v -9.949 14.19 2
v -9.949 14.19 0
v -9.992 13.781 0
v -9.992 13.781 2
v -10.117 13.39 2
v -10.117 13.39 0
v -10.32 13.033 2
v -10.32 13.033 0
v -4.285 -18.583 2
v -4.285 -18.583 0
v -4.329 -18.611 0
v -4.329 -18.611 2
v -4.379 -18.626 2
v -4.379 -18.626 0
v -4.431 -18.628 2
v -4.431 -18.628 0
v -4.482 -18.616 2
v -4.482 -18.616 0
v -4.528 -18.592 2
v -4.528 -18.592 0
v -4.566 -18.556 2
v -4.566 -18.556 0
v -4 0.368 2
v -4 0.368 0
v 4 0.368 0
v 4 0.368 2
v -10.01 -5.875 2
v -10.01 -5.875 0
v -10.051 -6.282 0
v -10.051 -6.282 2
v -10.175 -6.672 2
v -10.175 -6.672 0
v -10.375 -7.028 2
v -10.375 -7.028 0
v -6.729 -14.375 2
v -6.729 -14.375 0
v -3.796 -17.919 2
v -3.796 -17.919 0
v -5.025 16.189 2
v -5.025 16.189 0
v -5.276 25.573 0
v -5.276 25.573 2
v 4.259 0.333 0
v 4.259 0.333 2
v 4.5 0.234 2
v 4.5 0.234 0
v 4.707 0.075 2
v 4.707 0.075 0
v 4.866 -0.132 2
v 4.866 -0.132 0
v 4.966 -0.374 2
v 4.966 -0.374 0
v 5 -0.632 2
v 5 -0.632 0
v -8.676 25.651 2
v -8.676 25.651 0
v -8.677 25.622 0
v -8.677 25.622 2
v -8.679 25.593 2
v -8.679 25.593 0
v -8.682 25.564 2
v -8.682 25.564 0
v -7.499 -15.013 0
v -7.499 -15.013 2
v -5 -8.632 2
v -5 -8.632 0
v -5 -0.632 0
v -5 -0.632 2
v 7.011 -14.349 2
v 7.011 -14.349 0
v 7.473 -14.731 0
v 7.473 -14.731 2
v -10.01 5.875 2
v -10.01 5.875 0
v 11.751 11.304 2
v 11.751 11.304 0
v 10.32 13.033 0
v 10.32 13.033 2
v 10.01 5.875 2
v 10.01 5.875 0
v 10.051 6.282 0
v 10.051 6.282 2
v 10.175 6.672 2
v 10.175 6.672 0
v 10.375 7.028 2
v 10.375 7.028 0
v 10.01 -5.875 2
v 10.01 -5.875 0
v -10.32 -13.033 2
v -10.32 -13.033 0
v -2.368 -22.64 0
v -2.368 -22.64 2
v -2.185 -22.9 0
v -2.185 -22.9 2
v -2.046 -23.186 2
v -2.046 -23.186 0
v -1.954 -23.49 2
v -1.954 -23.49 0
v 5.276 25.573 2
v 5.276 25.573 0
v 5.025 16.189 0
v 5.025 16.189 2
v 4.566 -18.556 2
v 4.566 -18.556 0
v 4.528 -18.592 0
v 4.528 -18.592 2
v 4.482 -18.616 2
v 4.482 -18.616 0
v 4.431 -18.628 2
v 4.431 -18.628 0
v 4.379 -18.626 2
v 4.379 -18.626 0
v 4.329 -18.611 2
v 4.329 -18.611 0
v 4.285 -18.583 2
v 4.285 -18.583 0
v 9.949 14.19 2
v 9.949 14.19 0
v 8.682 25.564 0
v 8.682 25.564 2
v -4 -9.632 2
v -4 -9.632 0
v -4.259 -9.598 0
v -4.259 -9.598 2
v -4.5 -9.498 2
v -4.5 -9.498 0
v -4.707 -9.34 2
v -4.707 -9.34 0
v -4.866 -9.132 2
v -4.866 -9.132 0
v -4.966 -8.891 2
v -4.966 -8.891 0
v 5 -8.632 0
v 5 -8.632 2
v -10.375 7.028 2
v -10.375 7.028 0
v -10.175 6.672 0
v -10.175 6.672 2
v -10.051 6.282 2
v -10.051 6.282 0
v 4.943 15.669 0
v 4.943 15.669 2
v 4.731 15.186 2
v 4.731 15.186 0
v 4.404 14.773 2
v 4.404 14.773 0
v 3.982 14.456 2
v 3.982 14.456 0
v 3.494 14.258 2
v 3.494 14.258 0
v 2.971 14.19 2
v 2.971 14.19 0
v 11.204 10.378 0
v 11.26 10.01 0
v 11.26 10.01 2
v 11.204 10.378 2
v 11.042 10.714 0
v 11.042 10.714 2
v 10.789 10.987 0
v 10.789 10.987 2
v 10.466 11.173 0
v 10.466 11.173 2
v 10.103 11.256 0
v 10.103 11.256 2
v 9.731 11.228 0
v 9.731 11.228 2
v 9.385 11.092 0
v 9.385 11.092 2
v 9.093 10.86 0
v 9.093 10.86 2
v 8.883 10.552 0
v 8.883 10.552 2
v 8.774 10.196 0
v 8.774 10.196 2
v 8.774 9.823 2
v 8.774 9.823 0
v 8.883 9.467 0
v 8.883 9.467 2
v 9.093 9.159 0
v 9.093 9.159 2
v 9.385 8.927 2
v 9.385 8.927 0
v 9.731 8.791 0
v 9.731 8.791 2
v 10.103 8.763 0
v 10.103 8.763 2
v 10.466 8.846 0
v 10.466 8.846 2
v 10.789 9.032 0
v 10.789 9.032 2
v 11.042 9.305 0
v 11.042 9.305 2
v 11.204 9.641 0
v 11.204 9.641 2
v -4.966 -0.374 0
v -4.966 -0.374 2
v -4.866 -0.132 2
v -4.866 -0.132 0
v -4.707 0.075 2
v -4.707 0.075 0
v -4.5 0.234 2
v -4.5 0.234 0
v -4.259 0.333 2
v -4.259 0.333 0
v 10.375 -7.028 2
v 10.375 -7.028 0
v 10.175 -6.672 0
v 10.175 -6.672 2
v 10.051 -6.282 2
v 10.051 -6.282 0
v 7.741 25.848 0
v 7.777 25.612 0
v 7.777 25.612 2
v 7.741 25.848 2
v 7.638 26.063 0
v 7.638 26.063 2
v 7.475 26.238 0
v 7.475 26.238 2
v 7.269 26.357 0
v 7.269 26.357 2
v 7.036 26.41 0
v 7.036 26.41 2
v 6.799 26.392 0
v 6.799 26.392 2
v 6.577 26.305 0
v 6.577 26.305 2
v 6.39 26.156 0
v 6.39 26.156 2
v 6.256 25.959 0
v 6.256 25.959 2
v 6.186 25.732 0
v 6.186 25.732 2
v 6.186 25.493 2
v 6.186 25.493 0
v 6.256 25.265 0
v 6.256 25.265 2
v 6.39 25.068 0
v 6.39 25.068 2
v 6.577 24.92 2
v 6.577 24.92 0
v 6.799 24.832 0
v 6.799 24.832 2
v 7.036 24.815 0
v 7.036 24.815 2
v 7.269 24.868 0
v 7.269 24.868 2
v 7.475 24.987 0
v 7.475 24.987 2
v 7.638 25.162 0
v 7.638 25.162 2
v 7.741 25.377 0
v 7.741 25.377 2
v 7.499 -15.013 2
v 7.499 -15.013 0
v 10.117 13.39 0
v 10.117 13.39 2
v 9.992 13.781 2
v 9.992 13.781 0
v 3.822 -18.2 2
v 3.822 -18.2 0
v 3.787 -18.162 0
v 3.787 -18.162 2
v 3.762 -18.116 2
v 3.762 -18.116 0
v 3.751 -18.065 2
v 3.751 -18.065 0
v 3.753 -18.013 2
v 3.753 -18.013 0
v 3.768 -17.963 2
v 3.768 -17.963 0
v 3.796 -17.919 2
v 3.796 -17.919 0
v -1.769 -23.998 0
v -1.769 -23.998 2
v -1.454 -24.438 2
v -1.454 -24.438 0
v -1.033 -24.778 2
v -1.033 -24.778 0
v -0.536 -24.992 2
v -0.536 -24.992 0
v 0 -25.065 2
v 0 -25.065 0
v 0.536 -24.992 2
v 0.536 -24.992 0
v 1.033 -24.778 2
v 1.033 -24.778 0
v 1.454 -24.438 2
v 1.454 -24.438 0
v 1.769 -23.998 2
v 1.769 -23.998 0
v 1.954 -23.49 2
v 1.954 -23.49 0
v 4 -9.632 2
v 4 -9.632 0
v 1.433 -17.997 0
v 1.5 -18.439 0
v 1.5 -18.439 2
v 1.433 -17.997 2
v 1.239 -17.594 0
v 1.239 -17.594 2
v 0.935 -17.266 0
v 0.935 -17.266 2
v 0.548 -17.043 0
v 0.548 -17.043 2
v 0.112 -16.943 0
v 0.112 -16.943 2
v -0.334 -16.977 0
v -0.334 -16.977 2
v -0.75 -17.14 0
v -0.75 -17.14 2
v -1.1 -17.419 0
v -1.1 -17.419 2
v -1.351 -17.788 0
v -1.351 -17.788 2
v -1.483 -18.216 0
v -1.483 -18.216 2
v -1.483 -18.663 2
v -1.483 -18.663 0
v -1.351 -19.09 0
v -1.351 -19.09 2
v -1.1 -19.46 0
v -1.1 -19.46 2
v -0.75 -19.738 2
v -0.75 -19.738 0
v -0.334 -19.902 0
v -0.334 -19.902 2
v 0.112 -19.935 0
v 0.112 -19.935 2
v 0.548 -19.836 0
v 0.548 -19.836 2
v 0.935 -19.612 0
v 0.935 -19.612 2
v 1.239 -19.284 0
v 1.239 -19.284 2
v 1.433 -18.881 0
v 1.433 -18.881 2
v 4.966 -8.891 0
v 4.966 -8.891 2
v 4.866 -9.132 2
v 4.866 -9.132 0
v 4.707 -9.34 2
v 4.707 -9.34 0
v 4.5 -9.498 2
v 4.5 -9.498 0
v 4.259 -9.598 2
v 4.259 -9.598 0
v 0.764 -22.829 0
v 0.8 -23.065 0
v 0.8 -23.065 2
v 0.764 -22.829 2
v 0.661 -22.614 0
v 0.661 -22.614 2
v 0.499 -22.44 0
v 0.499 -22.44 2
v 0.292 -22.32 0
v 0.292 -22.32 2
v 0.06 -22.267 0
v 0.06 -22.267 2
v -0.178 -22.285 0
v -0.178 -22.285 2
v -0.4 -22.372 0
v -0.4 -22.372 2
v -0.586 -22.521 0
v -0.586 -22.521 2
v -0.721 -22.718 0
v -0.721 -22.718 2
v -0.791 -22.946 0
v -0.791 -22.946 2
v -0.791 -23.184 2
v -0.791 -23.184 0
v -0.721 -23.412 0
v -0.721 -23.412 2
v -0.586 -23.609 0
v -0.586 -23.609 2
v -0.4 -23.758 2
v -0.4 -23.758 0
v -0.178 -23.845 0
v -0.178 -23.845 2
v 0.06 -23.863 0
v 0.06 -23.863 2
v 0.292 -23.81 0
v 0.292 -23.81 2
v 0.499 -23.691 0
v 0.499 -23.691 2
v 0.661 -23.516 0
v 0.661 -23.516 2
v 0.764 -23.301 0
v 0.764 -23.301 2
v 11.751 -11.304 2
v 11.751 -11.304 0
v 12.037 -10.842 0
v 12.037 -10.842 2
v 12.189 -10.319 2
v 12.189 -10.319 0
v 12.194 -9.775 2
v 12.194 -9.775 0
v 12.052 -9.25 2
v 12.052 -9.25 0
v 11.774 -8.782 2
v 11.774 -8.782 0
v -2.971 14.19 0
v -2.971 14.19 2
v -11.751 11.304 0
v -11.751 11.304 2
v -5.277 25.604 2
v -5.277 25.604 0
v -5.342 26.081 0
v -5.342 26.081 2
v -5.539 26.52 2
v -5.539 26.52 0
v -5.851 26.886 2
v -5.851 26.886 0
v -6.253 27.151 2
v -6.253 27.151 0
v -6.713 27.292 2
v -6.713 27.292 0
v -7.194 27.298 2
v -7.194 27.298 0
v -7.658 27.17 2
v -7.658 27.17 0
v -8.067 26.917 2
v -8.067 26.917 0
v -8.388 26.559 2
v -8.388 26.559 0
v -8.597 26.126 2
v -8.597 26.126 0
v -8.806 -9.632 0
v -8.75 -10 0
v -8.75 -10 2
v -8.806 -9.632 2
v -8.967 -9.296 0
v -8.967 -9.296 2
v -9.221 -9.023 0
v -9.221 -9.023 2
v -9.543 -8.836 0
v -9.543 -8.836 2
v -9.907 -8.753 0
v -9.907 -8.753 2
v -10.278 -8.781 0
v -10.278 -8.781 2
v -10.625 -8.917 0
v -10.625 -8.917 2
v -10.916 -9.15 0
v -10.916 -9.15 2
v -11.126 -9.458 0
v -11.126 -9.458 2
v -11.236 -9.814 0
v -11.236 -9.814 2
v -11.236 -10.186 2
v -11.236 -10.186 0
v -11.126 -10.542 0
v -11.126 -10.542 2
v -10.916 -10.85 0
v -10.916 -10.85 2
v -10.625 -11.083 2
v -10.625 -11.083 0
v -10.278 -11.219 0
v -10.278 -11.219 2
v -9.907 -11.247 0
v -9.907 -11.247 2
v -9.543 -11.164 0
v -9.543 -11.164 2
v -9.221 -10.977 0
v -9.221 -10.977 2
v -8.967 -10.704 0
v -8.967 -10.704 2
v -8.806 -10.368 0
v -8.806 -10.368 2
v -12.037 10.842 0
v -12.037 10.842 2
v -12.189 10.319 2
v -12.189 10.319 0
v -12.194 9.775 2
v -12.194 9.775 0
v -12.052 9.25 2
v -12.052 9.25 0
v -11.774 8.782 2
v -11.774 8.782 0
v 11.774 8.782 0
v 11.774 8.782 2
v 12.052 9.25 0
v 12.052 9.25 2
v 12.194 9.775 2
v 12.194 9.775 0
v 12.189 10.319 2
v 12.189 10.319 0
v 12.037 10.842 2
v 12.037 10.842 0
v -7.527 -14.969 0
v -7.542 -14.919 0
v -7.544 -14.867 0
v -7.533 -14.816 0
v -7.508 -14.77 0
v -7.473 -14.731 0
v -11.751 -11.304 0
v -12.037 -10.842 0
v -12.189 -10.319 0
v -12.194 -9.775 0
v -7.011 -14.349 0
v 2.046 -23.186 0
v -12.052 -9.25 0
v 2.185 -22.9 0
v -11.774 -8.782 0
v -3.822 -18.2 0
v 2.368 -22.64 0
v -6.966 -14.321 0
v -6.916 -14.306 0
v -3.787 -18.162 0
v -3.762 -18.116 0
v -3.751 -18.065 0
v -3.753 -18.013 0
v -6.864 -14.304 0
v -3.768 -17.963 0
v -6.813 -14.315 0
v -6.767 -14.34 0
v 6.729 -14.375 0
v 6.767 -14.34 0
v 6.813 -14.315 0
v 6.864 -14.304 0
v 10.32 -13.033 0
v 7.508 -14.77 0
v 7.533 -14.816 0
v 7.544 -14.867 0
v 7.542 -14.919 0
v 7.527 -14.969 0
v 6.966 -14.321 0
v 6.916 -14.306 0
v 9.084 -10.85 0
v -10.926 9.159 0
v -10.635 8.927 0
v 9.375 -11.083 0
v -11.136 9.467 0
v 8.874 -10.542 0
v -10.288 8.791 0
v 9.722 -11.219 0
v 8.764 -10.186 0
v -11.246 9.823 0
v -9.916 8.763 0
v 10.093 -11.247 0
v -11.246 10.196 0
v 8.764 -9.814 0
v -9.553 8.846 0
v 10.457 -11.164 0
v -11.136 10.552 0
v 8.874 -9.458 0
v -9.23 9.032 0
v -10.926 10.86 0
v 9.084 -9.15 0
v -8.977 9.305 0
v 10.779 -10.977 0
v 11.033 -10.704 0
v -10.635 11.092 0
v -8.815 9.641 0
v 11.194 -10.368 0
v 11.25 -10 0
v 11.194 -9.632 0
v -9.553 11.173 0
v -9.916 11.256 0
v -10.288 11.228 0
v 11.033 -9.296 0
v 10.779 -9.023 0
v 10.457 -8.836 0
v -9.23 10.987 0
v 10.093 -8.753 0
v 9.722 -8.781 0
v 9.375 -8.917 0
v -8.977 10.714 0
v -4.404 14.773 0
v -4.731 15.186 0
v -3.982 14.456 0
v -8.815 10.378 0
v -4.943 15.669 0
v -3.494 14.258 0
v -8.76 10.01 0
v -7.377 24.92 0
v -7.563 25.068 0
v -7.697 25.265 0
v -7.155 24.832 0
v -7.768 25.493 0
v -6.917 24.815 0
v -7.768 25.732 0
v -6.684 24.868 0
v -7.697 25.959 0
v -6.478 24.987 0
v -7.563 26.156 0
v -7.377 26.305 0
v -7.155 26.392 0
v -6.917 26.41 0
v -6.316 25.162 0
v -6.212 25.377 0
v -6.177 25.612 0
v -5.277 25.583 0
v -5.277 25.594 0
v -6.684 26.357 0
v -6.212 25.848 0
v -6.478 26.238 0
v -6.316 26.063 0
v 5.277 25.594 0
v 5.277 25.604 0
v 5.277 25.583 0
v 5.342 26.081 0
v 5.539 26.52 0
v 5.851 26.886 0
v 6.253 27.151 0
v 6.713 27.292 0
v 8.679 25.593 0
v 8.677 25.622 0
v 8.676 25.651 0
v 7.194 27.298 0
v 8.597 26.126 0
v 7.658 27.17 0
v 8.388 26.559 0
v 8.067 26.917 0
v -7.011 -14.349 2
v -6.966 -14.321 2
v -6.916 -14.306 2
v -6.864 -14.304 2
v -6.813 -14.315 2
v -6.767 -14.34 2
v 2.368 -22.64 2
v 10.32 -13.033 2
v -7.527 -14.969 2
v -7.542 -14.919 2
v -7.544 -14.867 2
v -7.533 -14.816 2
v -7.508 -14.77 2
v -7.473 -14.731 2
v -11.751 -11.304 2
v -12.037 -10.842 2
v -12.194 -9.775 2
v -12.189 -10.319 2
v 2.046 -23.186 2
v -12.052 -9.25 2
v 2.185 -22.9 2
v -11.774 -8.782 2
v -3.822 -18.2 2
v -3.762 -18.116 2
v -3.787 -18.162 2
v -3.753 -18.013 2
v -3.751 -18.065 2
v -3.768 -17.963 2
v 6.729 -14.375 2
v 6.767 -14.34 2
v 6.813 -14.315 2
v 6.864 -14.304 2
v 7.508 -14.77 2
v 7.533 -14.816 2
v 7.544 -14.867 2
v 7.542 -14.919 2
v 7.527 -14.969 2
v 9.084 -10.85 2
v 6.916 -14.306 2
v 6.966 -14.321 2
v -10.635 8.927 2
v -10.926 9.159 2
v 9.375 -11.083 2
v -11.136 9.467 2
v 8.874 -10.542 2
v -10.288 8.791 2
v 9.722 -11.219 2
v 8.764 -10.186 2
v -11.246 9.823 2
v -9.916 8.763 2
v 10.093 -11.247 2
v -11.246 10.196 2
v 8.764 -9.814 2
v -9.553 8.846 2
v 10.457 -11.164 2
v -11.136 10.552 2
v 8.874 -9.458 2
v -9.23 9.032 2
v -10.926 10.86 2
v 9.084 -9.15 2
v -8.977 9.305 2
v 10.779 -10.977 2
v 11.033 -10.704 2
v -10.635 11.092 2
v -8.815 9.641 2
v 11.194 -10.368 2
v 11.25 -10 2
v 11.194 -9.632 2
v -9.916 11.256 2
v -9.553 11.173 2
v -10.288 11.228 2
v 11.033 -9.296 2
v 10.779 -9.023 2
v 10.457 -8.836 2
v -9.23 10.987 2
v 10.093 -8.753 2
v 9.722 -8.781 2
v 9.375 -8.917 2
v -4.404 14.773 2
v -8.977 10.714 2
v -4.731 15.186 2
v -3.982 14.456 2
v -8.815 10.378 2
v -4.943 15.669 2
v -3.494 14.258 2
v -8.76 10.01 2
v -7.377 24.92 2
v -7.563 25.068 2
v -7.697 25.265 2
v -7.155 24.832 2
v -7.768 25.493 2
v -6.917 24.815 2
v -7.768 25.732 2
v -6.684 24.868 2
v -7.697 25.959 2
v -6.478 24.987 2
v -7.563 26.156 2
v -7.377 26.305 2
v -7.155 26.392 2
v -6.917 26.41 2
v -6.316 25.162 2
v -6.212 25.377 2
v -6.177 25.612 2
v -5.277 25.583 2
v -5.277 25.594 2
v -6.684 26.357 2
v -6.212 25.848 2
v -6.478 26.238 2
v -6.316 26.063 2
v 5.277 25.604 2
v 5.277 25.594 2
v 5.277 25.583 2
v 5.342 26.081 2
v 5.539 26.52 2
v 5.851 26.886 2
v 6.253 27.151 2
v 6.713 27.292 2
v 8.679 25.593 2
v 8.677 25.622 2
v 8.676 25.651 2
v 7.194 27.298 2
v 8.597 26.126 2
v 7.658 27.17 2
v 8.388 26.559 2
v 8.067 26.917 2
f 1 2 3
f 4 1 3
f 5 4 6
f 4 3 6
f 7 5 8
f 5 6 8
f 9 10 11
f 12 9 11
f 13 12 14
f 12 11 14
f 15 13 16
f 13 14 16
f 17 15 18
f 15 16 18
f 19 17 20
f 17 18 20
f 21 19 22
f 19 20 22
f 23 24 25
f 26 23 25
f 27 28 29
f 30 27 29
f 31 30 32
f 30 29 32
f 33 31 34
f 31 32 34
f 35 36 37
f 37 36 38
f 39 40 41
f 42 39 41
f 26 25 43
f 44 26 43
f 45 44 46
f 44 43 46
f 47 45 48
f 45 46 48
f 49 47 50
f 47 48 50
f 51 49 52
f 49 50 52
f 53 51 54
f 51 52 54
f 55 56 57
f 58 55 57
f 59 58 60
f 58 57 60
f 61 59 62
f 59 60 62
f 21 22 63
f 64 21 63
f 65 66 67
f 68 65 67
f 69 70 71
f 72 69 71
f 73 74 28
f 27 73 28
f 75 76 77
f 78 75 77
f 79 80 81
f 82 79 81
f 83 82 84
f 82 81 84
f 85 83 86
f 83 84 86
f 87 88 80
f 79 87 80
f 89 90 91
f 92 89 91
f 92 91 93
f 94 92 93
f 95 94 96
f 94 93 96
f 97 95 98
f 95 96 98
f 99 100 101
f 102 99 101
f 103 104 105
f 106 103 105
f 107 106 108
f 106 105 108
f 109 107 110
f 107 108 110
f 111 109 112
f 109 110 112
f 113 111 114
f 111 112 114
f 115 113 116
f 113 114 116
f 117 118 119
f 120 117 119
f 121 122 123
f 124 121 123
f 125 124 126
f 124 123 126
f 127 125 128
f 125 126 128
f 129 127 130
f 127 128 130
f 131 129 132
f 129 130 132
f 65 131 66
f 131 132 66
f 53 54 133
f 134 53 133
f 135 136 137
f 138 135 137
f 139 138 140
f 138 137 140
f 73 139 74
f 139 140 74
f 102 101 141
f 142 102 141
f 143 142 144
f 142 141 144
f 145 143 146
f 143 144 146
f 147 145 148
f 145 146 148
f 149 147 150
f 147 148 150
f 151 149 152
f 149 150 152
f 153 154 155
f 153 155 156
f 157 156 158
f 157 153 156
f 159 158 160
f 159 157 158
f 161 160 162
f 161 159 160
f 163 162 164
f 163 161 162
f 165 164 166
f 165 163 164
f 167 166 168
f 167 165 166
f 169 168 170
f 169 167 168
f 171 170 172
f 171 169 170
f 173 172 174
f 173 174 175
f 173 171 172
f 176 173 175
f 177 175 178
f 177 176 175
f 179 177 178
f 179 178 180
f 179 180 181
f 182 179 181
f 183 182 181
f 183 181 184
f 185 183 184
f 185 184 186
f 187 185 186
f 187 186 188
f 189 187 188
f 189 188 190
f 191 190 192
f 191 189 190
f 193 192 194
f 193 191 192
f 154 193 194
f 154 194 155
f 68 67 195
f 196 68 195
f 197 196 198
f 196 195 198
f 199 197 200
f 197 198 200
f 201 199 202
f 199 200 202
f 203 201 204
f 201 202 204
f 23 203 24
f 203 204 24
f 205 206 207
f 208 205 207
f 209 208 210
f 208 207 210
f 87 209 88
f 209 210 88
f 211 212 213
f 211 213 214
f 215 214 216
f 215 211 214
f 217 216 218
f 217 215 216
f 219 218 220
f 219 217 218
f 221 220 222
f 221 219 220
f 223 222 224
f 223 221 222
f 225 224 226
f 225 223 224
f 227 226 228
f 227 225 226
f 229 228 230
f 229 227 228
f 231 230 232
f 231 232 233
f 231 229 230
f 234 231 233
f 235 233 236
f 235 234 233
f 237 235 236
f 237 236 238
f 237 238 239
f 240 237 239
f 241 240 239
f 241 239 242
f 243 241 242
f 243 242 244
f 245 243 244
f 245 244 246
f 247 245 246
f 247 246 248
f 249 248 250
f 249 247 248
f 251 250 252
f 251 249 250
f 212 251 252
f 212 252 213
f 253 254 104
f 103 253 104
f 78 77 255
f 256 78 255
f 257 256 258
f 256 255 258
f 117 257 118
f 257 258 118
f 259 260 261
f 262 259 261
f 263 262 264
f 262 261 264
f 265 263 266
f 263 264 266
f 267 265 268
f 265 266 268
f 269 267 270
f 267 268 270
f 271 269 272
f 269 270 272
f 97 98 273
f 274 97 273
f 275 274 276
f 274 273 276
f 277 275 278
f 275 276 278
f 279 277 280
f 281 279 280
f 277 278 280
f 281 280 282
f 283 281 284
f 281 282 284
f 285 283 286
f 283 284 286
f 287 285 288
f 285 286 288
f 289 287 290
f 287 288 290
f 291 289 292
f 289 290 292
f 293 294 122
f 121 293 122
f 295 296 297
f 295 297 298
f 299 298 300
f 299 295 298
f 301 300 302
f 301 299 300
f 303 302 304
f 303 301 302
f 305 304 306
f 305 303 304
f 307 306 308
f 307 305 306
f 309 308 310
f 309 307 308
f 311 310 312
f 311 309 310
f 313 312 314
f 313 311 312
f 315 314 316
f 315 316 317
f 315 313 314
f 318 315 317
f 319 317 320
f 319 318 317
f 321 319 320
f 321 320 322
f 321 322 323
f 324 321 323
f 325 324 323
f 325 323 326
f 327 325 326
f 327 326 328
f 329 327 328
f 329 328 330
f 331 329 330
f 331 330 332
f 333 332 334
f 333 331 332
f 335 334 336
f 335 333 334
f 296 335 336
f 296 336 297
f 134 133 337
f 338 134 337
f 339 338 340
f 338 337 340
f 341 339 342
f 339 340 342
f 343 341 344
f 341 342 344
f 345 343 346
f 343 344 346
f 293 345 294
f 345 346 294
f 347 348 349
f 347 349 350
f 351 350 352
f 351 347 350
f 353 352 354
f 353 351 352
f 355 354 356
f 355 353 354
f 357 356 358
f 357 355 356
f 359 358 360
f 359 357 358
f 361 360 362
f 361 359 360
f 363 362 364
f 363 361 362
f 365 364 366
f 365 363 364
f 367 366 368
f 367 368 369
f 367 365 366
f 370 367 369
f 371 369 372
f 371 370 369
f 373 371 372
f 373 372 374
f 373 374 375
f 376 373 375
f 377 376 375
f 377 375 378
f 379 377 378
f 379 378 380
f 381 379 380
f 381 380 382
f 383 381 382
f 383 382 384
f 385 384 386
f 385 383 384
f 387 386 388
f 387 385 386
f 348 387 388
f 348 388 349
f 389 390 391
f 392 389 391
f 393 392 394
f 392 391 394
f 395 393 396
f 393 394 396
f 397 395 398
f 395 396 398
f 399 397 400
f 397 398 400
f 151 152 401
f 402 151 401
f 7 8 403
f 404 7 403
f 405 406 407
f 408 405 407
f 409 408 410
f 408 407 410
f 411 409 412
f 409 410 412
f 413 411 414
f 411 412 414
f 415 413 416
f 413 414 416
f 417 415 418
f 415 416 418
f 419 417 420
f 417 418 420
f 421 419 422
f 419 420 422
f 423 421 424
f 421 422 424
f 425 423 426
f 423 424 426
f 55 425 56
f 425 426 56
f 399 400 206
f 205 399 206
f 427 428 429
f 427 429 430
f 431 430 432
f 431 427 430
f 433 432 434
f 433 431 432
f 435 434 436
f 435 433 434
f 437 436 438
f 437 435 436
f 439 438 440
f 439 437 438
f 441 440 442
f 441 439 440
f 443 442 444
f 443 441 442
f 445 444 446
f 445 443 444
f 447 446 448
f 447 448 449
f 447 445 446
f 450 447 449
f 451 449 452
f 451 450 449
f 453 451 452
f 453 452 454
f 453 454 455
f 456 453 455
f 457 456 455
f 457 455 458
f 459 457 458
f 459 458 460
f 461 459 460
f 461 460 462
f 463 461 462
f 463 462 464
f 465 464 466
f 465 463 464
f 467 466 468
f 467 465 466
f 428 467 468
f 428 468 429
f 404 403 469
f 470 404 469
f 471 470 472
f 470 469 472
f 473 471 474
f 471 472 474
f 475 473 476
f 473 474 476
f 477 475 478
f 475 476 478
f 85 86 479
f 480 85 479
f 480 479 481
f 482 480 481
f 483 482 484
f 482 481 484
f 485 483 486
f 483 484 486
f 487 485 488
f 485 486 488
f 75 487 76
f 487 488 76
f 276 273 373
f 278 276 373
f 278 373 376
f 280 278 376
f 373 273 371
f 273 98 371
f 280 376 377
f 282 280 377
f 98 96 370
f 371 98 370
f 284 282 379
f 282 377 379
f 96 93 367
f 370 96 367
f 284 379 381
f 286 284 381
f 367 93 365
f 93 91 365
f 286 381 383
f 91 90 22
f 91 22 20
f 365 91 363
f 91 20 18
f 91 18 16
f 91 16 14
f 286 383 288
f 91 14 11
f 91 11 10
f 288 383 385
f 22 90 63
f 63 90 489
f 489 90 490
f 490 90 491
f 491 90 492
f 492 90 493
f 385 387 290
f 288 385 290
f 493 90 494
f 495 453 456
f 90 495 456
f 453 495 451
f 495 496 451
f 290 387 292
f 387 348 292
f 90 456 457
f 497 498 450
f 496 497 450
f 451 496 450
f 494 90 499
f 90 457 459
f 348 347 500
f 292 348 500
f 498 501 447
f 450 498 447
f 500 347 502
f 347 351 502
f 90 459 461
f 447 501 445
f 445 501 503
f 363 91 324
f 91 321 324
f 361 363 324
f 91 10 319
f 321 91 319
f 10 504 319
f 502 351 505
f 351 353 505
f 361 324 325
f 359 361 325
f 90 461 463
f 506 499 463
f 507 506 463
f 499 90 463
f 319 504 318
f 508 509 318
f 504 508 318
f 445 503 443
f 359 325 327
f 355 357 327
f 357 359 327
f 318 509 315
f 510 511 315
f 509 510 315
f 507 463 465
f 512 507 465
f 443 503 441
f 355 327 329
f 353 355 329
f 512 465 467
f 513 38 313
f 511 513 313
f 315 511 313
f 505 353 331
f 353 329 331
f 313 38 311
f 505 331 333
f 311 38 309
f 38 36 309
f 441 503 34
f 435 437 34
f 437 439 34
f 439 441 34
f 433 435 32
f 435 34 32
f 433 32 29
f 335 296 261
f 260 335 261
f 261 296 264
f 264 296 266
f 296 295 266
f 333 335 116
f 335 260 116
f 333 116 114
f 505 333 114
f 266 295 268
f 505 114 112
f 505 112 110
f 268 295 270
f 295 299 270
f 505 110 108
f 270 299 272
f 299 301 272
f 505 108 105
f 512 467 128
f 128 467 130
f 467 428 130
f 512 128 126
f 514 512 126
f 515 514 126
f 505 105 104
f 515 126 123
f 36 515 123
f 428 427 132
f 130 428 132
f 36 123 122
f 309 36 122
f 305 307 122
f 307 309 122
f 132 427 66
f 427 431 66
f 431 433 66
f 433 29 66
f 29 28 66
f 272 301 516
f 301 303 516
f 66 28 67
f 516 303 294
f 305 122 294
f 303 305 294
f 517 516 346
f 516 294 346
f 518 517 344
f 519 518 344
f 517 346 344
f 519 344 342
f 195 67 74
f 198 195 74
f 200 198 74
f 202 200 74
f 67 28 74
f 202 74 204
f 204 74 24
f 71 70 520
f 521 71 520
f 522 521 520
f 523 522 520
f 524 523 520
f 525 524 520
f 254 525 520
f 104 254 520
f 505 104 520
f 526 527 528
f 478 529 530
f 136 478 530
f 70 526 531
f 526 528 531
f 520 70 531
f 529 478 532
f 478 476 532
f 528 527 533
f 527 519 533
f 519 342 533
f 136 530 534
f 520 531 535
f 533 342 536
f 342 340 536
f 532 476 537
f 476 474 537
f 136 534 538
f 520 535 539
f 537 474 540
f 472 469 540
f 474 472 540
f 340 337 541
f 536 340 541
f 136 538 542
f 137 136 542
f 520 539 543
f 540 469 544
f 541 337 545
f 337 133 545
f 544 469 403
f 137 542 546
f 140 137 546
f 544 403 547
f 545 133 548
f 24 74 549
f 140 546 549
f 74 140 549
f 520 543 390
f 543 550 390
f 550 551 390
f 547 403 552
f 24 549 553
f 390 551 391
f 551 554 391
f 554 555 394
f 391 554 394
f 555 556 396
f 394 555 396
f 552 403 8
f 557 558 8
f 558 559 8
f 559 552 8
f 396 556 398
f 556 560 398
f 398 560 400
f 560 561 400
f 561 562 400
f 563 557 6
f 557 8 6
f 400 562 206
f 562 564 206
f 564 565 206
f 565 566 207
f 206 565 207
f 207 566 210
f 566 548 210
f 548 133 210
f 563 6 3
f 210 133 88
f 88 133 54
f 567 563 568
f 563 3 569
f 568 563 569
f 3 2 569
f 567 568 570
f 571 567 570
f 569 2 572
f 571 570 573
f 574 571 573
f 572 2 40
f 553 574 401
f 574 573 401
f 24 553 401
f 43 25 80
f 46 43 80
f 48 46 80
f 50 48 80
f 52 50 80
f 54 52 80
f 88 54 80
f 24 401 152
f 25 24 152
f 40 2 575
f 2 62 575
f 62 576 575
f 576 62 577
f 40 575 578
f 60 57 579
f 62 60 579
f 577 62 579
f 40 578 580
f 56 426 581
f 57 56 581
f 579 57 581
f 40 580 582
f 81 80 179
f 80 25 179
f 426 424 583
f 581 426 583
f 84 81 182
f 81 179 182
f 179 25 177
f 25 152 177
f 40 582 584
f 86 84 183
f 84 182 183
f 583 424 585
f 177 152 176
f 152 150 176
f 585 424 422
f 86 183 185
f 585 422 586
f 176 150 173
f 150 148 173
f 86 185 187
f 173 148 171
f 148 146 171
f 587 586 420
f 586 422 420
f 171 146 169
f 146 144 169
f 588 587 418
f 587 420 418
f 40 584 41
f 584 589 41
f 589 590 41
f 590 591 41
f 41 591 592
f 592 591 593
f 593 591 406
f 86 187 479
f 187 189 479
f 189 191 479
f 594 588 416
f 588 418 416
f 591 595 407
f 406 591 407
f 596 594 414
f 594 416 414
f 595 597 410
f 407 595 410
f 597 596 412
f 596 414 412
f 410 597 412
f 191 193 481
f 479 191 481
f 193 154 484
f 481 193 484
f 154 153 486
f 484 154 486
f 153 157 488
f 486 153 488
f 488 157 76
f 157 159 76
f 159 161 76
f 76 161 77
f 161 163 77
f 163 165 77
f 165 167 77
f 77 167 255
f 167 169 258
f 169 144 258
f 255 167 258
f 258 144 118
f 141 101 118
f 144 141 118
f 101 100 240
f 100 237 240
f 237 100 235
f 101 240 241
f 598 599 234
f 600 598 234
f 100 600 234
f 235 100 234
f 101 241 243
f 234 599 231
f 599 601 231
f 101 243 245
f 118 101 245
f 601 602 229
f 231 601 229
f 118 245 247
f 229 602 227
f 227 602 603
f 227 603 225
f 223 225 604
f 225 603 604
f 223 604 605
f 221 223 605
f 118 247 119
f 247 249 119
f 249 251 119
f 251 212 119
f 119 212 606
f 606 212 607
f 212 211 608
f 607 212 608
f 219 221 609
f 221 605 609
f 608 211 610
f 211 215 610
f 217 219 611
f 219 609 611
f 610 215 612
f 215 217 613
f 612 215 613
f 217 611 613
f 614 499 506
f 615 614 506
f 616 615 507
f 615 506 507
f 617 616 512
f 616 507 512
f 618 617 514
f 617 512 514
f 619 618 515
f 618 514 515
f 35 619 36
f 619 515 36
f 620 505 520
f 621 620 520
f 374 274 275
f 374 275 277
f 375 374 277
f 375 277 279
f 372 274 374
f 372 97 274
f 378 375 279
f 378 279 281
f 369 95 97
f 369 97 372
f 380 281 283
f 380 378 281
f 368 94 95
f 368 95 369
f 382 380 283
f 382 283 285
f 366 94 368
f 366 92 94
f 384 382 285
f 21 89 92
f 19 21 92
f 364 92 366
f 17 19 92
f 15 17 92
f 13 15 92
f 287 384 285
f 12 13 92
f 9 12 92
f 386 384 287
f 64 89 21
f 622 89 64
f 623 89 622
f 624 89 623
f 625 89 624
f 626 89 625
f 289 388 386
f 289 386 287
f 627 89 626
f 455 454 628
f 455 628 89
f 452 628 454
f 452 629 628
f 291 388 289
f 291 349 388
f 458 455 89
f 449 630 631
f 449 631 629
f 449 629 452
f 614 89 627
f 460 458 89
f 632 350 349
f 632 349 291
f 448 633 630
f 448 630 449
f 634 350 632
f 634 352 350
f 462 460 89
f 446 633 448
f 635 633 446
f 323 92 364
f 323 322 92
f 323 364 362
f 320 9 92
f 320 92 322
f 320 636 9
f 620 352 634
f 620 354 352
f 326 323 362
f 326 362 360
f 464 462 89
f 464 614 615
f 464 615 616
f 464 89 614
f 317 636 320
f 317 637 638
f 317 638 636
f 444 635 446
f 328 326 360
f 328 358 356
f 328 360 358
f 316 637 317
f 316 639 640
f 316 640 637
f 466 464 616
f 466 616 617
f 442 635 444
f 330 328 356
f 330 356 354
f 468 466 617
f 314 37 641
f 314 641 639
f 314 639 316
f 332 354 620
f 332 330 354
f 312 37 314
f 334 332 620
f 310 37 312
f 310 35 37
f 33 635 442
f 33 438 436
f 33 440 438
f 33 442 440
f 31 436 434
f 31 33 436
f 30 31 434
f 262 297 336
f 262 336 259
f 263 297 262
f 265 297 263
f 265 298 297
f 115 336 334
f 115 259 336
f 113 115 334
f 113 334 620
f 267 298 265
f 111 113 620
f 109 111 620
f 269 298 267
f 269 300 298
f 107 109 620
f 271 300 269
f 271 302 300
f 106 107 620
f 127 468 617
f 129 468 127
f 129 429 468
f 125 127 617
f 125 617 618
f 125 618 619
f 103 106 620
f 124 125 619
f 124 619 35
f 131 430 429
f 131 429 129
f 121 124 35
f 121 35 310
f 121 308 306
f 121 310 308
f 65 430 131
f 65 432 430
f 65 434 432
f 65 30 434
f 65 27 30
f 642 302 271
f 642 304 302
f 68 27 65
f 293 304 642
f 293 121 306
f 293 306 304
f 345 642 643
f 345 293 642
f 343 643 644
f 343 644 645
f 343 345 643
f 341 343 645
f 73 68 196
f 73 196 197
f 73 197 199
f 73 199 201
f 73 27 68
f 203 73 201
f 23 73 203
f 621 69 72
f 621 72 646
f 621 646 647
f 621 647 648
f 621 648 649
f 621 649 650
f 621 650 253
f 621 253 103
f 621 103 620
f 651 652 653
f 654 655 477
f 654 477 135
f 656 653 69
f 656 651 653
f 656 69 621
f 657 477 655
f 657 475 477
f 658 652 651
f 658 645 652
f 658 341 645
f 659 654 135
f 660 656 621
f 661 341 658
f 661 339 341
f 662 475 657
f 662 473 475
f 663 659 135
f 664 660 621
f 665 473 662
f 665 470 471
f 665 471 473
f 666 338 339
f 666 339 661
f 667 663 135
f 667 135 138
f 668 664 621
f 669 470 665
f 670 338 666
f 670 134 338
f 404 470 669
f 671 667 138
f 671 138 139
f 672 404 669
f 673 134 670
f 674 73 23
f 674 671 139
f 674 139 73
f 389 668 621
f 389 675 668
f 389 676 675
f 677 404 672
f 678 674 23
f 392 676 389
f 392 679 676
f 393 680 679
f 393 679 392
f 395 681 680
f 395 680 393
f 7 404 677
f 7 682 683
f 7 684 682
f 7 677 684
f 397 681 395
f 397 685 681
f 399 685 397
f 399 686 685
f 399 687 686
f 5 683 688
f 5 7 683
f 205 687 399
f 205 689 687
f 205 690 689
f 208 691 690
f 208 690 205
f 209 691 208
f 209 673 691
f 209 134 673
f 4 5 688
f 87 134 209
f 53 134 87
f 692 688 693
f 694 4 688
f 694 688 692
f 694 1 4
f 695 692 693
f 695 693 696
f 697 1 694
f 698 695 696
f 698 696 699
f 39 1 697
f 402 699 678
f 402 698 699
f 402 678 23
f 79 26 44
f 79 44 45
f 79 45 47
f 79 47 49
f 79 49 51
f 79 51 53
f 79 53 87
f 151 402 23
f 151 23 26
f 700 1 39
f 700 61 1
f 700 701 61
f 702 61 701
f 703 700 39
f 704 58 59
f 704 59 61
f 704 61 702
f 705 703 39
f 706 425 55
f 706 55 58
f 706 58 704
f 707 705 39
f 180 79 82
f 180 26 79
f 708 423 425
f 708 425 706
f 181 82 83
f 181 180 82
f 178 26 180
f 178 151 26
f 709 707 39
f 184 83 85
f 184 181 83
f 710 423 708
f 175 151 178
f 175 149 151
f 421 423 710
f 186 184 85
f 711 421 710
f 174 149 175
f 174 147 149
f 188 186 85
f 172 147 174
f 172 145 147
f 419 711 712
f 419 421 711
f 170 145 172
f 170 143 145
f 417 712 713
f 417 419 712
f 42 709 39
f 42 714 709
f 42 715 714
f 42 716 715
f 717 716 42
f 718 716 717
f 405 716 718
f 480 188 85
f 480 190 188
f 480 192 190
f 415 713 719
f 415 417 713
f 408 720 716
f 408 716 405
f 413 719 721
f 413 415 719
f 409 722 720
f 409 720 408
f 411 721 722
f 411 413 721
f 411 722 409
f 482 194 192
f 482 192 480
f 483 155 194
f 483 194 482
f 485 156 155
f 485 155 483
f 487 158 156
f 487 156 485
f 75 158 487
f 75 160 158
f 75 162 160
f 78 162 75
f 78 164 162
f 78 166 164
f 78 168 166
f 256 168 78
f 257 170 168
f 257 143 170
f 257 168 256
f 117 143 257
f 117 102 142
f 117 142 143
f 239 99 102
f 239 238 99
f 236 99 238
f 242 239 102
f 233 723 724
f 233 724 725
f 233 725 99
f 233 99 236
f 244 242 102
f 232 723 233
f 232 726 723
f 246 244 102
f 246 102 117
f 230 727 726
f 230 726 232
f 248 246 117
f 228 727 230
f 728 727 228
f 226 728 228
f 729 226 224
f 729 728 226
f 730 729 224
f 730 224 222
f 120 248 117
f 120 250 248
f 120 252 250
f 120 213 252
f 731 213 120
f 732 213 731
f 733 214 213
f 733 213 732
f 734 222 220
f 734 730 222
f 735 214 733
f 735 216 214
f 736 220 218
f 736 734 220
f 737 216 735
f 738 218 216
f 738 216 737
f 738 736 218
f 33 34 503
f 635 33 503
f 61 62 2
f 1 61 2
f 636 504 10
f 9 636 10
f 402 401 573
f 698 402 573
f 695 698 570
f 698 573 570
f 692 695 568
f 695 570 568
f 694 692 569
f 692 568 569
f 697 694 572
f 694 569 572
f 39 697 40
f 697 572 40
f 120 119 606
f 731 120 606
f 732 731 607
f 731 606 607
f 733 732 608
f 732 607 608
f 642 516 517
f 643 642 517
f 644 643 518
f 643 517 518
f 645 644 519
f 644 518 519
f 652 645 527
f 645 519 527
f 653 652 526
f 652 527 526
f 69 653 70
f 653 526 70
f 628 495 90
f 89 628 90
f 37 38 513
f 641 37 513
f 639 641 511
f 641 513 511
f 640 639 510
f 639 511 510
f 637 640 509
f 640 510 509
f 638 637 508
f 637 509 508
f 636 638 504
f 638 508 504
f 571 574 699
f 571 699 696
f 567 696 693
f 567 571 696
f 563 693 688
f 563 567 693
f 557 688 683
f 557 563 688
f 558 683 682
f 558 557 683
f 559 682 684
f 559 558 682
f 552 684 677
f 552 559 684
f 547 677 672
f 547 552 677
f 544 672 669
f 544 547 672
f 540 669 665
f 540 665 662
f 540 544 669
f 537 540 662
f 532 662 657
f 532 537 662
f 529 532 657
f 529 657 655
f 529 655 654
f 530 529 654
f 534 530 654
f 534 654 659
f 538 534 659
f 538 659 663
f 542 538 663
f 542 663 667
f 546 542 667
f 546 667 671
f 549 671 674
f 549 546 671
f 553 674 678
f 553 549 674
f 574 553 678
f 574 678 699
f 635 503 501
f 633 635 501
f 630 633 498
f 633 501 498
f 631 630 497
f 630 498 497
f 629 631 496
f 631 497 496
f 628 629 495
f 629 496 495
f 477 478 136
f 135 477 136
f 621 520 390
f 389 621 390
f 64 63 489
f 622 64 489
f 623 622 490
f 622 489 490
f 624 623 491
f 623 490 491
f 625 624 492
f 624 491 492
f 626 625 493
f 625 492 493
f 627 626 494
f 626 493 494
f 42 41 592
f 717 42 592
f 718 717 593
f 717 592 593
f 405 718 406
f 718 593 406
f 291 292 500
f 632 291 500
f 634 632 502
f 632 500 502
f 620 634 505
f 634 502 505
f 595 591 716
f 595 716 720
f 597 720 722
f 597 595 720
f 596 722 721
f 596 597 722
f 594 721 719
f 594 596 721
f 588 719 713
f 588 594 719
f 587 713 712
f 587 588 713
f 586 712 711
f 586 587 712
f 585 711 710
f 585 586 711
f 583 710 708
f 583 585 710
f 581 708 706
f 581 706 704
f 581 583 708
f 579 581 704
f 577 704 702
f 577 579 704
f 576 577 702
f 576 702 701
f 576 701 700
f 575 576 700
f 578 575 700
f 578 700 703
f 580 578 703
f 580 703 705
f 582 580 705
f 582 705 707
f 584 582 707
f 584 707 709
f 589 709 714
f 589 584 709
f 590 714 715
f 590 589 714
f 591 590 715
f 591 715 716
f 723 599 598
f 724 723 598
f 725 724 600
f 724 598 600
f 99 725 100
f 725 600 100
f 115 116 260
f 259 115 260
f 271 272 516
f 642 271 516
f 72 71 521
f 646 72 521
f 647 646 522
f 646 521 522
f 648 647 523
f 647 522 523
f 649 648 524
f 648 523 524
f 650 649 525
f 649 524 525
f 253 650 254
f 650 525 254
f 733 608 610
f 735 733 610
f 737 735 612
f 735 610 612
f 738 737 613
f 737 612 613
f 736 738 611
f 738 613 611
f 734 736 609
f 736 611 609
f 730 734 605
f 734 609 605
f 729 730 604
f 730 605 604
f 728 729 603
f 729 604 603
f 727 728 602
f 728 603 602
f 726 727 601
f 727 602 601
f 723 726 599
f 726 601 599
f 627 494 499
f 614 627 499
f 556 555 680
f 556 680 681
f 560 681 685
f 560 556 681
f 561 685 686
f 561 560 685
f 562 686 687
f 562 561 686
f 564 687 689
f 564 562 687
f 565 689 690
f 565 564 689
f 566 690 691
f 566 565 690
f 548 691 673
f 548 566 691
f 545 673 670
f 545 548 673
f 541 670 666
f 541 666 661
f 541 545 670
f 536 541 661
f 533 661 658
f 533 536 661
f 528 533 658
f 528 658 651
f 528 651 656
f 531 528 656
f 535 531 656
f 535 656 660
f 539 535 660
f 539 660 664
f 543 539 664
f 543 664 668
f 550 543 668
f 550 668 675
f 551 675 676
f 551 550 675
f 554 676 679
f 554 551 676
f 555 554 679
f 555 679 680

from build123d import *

# Parameters (mm, degrees)
F0_R     = 0.8
F0_R_2   = 1.5
F0_R_3   = 1.25
F1_DEPTH = 2


with BuildPart() as f1:
    # F0 (on Top) → F1 (new body)
    with BuildSketch(Plane.XY):
        with BuildLine():
            Line((10.009608, -5.875233), (10.009608, 5.875233))
            ThreePointArc((10.009608, 5.875233), (10.10321, 6.479919), (10.375253, 7.028005))
            Line((10.375253, 7.028005), (11.773889, 8.782295))
            ThreePointArc((11.773889, 8.782295), (12.209984, 10.04744), (11.750731, 11.304364))
            Line((11.750731, 11.304364), (10.320118, 13.032675))
            ThreePointArc((10.320118, 13.032675), (10.044588, 13.582548), (9.949174, 14.190143))
            Line((9.949174, 14.190143), (8.682091, 25.56351))
            ThreePointArc((8.682091, 25.56351), (8.678182, 25.607343), (8.676205, 25.651306))
            ThreePointArc((8.676205, 25.651306), (6.95314, 27.312167), (5.276671, 25.604284))
            ThreePointArc((5.276671, 25.604284), (5.276621, 25.588507), (5.276322, 25.572732))
            Line((5.276322, 25.572732), (5.024577, 16.189424))
            ThreePointArc((5.024577, 16.189424), (4.40399, 14.772505), (2.970938, 14.190143))
            Line((2.970938, 14.190143), (-2.970938, 14.190143))
            ThreePointArc((-2.970938, 14.190143), (-4.40399, 14.772505), (-5.024577, 16.189424))
            Line((-5.024577, 16.189424), (-5.276322, 25.572732))
            ThreePointArc((-5.276322, 25.572732), (-5.276621, 25.588507), (-5.276671, 25.604284))
            ThreePointArc((-5.276671, 25.604284), (-6.95314, 27.312167), (-8.676205, 25.651306))
            ThreePointArc((-8.676205, 25.651306), (-8.678182, 25.607343), (-8.682091, 25.56351))
            Line((-8.682091, 25.56351), (-9.949174, 14.190143))
            ThreePointArc((-9.949174, 14.190143), (-10.044588, 13.582548), (-10.320118, 13.032675))
            Line((-10.320118, 13.032675), (-11.750731, 11.304364))
            ThreePointArc((-11.750731, 11.304364), (-12.209984, 10.04744), (-11.773889, 8.782295))
            Line((-11.773889, 8.782295), (-10.375253, 7.028005))
            ThreePointArc((-10.375253, 7.028005), (-10.10321, 6.479919), (-10.009608, 5.875233))
            Line((-10.009608, 5.875233), (-10.009608, -5.875233))
            ThreePointArc((-10.009608, -5.875233), (-10.10321, -6.479919), (-10.375253, -7.028005))
            Line((-10.375253, -7.028005), (-11.773889, -8.782295))
            ThreePointArc((-11.773889, -8.782295), (-12.209984, -10.04744), (-11.750731, -11.304364))
            Line((-11.750731, -11.304364), (-10.320118, -13.032675))
            Line((-10.320118, -13.032675), (-2.368045, -22.639501))
            ThreePointArc((-2.368045, -22.639501), (-2.11021, -23.039914), (-1.954354, -23.489934))
            ThreePointArc((-1.954354, -23.489934), (0, -25.065081), (1.954354, -23.489934))
            ThreePointArc((1.954354, -23.489934), (2.11021, -23.039914), (2.368045, -22.639501))
            Line((2.368045, -22.639501), (10.320118, -13.032675))
            Line((10.320118, -13.032675), (11.750731, -11.304364))
            ThreePointArc((11.750731, -11.304364), (12.209984, -10.04744), (11.773889, -8.782295))
            Line((11.773889, -8.782295), (10.375253, -7.028005))
            ThreePointArc((10.375253, -7.028005), (10.10321, -6.479919), (10.009608, -5.875233))
        make_face()
        with Locations((0, -23.06508)):
            Circle(F0_R, mode=Mode.SUBTRACT)
        with BuildLine():
            Line((-4.566131, -18.556385), (-7.499292, -15.01286))
            ThreePointArc((-7.499292, -15.01286), (-7.544344, -14.866566), (-7.472755, -14.731265))
            Line((-7.472755, -14.731265), (-7.010556, -14.348679))
            ThreePointArc((-7.010556, -14.348679), (-6.864262, -14.303627), (-6.728961, -14.375216))
            Line((-6.728961, -14.375216), (-3.7958, -17.918741))
            ThreePointArc((-3.7958, -17.918741), (-3.750748, -18.065034), (-3.822337, -18.200336))
            Line((-3.822337, -18.200336), (-4.284536, -18.582922))
            ThreePointArc((-4.284536, -18.582922), (-4.43083, -18.627974), (-4.566131, -18.556385))
        make_face(mode=Mode.SUBTRACT)
        with Locations((0, -18.439241)):
            Circle(F0_R_2, mode=Mode.SUBTRACT)
        with Locations((-10, -10)):
            Circle(F0_R_3, mode=Mode.SUBTRACT)
        with BuildLine():
            ThreePointArc((5, -8.632429), (4.707107, -9.339536), (4, -9.632429))
            Line((4, -9.632429), (-4, -9.632429))
            ThreePointArc((-4, -9.632429), (-4.707107, -9.339536), (-5, -8.632429))
            Line((-5, -8.632429), (-5, -0.632429))
            ThreePointArc((-5, -0.632429), (-4.707107, 0.074678), (-4, 0.367571))
            Line((-4, 0.367571), (4, 0.367571))
            ThreePointArc((4, 0.367571), (4.707107, 0.074678), (5, -0.632429))
            Line((5, -0.632429), (5, -8.632429))
        make_face(mode=Mode.SUBTRACT)
        with BuildLine():
            Line((3.7958, -17.918741), (6.728961, -14.375216))
            ThreePointArc((6.728961, -14.375216), (6.864262, -14.303627), (7.010556, -14.348679))
            Line((7.010556, -14.348679), (7.472755, -14.731265))
            ThreePointArc((7.472755, -14.731265), (7.544344, -14.866566), (7.499292, -15.01286))
            Line((7.499292, -15.01286), (4.566131, -18.556385))
            ThreePointArc((4.566131, -18.556385), (4.43083, -18.627974), (4.284536, -18.582922))
            Line((4.284536, -18.582922), (3.822337, -18.200336))
            ThreePointArc((3.822337, -18.200336), (3.750748, -18.065034), (3.7958, -17.918741))
        make_face(mode=Mode.SUBTRACT)
        with Locations((10, -10)):
            Circle(F0_R_3, mode=Mode.SUBTRACT)
        with Locations((-10.009608, 10.009608)):
            Circle(F0_R_3, mode=Mode.SUBTRACT)
        with Locations((-6.976652, 25.61233)):
            Circle(F0_R, mode=Mode.SUBTRACT)
        with Locations((10.009608, 10.009608)):
            Circle(F0_R_3, mode=Mode.SUBTRACT)
        with Locations((6.976652, 25.61233)):
            Circle(F0_R, mode=Mode.SUBTRACT)
    extrude(amount=F1_DEPTH)


solid = f1.part
